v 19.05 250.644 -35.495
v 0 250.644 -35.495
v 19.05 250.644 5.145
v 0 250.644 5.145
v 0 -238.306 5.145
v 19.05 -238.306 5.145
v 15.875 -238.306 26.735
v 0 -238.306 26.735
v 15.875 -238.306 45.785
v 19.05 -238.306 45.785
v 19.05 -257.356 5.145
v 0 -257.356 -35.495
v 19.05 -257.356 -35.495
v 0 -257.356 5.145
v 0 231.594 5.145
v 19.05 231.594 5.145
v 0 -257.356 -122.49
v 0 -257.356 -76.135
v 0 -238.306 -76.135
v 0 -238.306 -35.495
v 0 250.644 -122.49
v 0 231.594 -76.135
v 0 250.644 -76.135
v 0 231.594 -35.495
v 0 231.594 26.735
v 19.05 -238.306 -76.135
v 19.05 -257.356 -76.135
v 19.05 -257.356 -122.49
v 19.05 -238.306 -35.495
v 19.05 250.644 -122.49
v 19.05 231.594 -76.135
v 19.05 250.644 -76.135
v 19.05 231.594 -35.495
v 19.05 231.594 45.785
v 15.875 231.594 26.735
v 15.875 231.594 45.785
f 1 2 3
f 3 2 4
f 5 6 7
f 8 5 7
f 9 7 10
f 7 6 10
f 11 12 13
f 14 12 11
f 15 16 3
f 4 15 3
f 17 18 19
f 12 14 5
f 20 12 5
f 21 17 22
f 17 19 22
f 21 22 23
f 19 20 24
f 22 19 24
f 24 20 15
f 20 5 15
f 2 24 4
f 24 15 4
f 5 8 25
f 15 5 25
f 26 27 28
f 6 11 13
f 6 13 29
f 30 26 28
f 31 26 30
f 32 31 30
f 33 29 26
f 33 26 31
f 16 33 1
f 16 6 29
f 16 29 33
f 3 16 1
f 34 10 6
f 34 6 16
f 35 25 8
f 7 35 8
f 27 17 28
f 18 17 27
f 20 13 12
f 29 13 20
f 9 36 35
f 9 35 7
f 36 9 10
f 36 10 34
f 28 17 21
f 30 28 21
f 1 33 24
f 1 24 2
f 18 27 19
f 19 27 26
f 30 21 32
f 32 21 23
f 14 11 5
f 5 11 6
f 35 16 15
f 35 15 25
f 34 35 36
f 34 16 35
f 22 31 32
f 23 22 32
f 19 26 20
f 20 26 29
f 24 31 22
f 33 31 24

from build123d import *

# Parameters (mm, degrees)
F0_W     = 508
F0_H     = 168.275
F1_DEPTH = 19.05
F2_W     = 19.05
F2_H     = 40.64
F2_H_2   = 34.925
F3_DEPTH = 25.4
F4_W     = 469.9
F4_H     = 19.05
F5_DEPTH = 15.875


with BuildPart() as f1:
    # F0 (on Right) → F1 (new body)
    with BuildSketch(Plane.YZ):
        with Locations((-3.356125, -38.352349)):
            Rectangle(F0_W, F0_H)
    extrude(amount=F1_DEPTH)

    # F2 (on face) → F3 (cut)
    with BuildSketch(Plane.YZ.offset(19.05)):
        with Locations((241.118875, 25.465151)):
            Rectangle(F2_W, F2_H)
        with Locations((241.118875, -55.814849)):
            Rectangle(F2_W, F2_H)
        with Locations((241.118875, -139.952349)):
            Rectangle(F2_W, F2_H_2)
        with Locations((-247.831125, -55.814849)):
            Rectangle(F2_W, F2_H)
        with Locations((-247.831125, 25.465151)):
            Rectangle(F2_W, F2_H)
    extrude(amount=-F3_DEPTH, mode=Mode.SUBTRACT)

    # F4 (on face) → F5 (cut)
    with BuildSketch(Plane(origin=(0, 0, 0), x_dir=(0, -1, 0), z_dir=(-1, 0, 0))):
        with Locations((3.356125, 36.260151)):
            Rectangle(F4_W, F4_H)
    extrude(amount=-F5_DEPTH, mode=Mode.SUBTRACT)


solid = f1.part
